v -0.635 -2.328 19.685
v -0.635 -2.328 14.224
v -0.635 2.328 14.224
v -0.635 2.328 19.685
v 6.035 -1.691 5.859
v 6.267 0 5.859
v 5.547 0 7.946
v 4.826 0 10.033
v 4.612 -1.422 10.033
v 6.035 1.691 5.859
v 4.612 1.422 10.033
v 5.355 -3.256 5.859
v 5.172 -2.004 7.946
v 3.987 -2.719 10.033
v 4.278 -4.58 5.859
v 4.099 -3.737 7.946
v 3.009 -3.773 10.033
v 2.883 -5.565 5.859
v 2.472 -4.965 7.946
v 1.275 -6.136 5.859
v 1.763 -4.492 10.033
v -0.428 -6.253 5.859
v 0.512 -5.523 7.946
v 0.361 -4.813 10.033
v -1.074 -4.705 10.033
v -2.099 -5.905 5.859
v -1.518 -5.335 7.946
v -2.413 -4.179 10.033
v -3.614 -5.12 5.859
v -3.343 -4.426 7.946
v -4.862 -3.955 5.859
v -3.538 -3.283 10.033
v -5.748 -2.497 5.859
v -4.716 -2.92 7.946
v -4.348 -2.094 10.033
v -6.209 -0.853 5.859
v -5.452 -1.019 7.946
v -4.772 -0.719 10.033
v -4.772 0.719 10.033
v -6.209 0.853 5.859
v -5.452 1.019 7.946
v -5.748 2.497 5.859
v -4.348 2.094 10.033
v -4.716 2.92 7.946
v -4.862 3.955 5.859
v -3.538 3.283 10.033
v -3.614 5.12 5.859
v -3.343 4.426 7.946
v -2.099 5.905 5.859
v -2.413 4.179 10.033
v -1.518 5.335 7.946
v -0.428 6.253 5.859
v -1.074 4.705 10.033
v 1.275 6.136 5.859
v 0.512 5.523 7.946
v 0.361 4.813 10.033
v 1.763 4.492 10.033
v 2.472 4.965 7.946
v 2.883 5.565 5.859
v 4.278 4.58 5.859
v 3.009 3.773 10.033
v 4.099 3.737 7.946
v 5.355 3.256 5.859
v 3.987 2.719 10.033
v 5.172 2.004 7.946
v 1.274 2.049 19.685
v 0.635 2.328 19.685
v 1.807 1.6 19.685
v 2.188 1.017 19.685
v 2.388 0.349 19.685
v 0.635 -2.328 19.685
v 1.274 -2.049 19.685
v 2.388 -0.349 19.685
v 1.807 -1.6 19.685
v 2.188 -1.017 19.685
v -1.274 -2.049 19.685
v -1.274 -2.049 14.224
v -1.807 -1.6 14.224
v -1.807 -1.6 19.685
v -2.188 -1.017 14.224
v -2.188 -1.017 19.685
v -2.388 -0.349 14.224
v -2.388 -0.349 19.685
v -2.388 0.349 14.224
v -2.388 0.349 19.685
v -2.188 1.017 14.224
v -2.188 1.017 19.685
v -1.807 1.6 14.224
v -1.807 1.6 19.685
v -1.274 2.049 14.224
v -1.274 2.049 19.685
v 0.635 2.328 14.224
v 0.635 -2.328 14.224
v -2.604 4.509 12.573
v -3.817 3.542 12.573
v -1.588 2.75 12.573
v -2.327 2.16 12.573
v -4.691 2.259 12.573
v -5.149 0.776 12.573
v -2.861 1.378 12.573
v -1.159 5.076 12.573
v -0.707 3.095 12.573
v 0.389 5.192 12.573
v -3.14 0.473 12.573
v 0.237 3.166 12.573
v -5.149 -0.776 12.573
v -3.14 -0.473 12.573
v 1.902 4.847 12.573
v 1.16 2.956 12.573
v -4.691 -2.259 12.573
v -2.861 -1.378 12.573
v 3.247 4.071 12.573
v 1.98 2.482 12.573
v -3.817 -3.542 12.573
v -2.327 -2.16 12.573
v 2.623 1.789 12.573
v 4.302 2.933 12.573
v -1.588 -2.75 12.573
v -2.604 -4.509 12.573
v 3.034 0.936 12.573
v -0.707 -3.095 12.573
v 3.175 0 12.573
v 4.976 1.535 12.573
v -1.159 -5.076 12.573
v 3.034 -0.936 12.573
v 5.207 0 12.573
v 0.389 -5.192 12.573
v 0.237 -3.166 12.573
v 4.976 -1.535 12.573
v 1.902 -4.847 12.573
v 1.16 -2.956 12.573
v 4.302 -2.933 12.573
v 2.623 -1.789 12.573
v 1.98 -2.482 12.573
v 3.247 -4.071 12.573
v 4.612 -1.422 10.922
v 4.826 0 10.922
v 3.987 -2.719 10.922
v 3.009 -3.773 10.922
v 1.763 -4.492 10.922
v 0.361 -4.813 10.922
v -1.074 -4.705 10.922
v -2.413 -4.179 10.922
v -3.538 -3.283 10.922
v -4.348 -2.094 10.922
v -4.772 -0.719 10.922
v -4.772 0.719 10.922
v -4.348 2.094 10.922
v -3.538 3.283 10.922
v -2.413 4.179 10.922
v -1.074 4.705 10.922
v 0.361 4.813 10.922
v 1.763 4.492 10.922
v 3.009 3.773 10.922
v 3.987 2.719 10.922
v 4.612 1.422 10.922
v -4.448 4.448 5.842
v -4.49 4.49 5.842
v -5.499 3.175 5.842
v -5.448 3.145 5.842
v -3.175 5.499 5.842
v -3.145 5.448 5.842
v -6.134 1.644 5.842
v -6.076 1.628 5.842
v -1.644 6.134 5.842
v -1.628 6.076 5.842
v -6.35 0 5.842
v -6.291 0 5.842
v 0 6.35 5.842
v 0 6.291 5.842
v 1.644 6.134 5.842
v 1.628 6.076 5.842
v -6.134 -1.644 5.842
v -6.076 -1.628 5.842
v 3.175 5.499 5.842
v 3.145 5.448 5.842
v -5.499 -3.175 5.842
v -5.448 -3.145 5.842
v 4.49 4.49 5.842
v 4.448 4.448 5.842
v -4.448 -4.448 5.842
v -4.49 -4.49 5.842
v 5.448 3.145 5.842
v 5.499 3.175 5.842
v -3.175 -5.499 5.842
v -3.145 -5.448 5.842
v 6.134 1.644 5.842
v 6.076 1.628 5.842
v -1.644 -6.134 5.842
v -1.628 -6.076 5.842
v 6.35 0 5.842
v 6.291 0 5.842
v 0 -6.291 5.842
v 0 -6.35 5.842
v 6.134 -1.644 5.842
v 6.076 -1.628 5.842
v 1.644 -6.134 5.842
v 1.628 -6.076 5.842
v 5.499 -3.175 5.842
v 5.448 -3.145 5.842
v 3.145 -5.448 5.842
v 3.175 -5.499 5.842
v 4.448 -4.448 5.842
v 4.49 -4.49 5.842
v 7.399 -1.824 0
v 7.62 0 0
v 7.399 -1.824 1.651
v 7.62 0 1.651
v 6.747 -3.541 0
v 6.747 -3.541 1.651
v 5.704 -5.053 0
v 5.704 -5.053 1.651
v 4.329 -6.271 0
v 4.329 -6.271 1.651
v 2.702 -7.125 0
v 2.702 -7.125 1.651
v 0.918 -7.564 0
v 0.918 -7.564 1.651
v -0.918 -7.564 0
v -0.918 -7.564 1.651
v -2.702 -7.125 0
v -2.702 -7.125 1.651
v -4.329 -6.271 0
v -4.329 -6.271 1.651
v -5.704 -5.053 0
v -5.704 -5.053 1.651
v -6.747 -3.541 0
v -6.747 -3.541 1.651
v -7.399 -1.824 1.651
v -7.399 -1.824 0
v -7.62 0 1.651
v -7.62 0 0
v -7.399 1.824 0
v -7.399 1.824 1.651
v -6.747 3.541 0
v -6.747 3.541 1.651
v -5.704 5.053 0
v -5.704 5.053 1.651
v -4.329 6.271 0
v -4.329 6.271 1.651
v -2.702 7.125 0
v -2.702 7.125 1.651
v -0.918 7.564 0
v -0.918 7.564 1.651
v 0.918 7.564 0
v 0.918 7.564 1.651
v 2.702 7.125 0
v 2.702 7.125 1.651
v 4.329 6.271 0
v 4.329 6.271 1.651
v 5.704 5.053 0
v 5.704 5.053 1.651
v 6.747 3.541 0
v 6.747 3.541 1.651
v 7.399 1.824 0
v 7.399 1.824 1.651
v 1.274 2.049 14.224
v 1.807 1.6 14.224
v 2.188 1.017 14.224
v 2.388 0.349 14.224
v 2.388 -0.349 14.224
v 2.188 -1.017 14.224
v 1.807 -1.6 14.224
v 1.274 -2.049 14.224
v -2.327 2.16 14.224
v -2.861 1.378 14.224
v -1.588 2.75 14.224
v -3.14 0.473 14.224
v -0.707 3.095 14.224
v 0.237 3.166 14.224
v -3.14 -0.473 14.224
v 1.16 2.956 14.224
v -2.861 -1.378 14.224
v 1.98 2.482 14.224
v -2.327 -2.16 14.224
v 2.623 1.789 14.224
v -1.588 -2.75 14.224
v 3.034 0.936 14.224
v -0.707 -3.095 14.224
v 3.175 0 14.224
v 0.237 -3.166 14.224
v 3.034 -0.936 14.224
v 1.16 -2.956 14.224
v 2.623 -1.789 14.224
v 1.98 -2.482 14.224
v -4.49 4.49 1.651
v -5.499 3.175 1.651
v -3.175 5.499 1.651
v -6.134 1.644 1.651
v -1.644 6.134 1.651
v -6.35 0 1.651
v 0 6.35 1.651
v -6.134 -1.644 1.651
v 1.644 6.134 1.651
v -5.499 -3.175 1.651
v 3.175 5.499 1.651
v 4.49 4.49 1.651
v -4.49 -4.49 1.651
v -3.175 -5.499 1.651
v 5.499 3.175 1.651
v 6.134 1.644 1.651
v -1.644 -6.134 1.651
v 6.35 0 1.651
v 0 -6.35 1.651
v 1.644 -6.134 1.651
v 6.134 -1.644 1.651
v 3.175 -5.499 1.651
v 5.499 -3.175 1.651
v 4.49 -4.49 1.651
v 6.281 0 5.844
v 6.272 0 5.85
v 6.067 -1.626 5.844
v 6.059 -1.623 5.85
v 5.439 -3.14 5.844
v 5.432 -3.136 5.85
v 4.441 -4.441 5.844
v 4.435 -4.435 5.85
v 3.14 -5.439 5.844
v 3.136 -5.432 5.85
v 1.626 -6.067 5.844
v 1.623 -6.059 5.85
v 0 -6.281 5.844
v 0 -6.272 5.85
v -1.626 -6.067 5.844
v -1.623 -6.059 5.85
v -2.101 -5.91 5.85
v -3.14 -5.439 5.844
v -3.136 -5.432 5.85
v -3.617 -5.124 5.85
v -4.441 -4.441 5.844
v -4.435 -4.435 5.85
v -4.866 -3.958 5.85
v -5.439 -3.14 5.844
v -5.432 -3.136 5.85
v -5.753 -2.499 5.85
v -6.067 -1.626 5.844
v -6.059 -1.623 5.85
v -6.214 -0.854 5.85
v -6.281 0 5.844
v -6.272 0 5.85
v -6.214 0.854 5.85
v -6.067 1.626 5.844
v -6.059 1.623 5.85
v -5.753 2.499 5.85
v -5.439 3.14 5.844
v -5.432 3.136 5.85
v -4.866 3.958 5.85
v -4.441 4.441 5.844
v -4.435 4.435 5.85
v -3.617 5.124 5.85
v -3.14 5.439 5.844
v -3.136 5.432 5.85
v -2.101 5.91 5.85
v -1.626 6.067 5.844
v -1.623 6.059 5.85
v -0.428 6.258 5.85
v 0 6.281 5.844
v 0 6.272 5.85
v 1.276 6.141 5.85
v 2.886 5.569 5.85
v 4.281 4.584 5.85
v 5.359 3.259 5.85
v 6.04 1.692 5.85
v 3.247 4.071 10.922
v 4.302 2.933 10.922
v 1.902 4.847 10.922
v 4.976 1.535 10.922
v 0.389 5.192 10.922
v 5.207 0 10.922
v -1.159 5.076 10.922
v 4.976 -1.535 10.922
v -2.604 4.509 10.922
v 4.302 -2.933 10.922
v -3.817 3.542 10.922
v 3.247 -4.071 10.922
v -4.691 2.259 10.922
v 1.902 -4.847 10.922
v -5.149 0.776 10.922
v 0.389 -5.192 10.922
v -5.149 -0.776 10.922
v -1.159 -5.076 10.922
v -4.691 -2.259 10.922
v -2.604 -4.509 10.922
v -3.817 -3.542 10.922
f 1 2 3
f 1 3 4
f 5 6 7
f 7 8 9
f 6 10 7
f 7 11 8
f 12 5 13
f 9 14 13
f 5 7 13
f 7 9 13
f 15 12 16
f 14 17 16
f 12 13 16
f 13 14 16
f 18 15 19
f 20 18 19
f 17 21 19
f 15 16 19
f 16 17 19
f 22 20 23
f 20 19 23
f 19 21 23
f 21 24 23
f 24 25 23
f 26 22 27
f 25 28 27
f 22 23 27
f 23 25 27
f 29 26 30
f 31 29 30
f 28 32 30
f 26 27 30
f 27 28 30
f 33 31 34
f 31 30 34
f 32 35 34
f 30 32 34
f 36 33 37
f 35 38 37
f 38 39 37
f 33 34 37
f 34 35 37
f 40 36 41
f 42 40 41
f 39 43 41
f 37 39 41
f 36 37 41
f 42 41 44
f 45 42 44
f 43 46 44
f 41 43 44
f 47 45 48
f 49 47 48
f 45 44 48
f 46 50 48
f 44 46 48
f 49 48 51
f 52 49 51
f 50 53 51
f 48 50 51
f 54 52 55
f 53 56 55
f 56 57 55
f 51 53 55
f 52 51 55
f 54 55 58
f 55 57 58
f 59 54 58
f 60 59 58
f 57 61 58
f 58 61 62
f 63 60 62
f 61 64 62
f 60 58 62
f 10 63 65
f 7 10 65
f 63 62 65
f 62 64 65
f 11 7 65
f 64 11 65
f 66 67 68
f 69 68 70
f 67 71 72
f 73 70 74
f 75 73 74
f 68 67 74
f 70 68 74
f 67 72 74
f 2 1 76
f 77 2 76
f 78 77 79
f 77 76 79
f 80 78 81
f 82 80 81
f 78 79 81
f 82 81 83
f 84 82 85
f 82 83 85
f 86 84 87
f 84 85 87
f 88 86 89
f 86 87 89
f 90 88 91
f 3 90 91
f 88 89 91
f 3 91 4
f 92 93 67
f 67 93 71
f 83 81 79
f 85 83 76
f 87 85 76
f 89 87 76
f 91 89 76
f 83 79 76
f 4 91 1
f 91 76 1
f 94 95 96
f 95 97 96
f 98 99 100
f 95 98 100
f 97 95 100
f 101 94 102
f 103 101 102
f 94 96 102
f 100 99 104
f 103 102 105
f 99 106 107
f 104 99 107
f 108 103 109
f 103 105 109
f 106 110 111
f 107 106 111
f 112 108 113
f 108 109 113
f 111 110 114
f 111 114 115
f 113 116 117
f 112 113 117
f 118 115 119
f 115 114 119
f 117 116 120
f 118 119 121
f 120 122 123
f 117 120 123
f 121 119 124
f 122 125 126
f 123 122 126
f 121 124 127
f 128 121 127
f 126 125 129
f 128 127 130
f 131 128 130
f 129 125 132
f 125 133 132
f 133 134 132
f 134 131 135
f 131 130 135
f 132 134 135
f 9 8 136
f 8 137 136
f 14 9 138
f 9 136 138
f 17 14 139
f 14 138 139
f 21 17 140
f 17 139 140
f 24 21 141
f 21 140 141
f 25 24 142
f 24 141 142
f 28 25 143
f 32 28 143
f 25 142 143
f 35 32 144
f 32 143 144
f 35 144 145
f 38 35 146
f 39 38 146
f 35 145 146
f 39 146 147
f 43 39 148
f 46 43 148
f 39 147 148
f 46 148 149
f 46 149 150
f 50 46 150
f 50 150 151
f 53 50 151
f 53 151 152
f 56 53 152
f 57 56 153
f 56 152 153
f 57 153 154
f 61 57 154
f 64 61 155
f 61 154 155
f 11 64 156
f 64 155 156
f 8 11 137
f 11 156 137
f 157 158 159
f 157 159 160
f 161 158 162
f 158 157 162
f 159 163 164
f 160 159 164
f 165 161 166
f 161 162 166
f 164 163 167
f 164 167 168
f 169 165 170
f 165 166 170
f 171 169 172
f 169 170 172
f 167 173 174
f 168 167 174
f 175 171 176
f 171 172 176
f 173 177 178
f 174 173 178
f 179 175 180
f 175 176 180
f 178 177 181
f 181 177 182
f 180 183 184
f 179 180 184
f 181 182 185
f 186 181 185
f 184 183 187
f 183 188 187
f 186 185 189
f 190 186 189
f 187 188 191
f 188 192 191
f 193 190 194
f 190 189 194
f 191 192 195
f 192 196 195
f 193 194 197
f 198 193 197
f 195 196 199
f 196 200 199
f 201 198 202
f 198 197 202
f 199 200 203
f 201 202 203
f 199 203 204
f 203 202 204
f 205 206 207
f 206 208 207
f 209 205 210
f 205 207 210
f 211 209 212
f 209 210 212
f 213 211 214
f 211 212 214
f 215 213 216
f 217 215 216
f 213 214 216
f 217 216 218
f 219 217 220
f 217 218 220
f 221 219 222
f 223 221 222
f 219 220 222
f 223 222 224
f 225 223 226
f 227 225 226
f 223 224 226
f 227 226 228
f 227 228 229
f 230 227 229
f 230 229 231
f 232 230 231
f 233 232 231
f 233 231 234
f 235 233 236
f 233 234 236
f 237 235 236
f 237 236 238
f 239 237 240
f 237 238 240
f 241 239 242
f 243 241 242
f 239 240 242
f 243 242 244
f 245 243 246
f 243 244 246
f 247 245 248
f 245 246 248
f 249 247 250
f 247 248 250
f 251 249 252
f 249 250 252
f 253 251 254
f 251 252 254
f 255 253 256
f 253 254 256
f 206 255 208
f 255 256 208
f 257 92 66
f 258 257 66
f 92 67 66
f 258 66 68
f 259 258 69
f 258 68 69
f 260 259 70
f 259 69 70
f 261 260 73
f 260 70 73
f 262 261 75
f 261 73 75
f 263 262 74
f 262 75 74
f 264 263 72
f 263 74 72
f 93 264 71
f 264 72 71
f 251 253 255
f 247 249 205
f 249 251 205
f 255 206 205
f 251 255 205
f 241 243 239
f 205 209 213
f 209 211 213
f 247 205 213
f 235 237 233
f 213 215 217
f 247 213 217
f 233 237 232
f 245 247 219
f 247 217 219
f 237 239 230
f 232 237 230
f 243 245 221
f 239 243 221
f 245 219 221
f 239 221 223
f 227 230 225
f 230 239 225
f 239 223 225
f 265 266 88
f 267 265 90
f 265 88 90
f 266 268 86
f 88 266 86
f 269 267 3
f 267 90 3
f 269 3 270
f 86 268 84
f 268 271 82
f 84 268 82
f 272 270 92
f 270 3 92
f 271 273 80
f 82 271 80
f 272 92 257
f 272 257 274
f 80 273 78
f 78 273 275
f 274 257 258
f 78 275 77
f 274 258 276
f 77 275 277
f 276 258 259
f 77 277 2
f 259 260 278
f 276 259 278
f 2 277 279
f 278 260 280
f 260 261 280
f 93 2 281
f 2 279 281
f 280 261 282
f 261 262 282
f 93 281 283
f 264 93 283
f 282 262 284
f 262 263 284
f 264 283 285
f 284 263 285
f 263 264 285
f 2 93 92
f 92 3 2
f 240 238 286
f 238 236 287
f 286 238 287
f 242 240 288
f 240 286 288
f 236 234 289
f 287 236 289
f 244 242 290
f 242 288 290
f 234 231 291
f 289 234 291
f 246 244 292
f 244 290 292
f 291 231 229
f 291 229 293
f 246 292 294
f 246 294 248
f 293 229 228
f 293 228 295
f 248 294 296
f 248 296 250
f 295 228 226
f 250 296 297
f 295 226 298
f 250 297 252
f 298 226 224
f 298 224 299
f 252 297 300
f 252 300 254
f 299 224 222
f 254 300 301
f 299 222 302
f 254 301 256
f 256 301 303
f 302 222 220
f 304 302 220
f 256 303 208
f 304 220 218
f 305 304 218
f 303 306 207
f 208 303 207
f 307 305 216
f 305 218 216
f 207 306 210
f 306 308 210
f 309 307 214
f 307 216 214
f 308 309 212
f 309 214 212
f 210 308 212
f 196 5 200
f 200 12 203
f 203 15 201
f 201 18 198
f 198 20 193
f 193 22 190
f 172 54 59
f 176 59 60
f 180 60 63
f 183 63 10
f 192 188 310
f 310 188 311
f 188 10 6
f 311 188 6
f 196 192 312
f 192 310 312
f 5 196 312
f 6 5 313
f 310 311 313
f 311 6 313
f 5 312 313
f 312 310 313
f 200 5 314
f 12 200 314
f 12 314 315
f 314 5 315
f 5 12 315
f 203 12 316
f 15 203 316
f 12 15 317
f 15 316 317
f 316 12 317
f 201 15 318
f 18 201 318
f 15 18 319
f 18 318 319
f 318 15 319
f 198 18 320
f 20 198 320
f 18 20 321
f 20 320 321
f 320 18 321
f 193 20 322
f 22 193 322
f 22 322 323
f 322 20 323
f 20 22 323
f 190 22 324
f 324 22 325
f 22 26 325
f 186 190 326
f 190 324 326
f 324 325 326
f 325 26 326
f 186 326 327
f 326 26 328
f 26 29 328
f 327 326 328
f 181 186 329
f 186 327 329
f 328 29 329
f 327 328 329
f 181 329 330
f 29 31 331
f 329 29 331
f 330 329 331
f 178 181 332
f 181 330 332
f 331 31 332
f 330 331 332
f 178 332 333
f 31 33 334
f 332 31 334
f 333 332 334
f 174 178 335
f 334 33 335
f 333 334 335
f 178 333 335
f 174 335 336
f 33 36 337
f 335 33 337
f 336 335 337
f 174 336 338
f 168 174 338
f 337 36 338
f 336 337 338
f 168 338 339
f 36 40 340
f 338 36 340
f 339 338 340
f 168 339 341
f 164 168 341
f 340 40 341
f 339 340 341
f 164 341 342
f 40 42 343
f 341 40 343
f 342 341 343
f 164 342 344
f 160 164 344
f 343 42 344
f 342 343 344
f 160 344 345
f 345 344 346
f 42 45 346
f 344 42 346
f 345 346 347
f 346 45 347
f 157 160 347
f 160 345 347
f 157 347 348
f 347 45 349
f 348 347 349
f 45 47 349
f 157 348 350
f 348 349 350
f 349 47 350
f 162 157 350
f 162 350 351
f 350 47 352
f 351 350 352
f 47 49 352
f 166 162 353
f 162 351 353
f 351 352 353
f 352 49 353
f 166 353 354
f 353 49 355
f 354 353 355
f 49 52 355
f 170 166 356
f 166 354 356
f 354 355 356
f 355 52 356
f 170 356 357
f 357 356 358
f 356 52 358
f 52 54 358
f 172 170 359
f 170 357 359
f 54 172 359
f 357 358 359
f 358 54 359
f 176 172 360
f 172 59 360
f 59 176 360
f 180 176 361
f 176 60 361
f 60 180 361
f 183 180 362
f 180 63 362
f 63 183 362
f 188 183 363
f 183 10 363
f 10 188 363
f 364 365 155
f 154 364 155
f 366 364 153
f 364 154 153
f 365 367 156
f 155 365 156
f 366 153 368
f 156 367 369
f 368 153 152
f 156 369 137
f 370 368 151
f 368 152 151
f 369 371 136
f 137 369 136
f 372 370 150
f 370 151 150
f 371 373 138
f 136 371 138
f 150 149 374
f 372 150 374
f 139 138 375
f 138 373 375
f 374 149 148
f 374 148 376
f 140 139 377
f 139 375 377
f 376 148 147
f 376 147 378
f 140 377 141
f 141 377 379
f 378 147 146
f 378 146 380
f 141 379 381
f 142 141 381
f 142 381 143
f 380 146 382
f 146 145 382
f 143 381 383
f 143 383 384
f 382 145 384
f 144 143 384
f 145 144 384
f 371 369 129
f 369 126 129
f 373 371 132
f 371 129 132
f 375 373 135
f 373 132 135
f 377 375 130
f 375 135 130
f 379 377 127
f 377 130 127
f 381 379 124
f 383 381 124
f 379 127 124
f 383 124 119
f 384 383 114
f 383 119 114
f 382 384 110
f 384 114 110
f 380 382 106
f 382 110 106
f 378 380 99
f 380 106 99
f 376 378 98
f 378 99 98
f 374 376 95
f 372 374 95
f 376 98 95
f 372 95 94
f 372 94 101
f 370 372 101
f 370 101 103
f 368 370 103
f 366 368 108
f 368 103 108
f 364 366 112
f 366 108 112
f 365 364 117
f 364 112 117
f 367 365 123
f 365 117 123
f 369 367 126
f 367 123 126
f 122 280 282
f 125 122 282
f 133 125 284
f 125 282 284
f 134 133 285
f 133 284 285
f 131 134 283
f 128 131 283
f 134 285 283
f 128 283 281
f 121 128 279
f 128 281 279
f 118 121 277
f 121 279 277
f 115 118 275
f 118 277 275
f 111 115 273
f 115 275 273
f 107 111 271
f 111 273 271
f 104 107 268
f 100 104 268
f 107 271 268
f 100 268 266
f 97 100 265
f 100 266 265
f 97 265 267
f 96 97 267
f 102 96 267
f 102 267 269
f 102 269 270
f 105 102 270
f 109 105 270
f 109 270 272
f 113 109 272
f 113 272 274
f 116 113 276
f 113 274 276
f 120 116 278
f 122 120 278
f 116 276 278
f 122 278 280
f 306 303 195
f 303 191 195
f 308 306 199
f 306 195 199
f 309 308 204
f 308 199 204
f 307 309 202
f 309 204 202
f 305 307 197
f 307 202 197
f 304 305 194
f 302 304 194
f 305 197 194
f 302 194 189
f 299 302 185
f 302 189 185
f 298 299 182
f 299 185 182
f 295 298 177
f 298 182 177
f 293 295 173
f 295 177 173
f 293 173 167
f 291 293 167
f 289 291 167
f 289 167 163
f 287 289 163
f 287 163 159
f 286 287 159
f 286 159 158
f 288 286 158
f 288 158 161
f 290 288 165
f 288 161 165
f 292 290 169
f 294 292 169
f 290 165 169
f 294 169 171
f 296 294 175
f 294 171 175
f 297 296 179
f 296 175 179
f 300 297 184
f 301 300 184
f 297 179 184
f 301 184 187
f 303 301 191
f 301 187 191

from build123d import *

# Parameters (mm, degrees)
F0_W     = 0.635
F0_H     = 5.461
F2_DEPTH = 3.175


with BuildPart() as f1:
    # F0 (on Front) → F1 (revolve)
    with BuildSketch(Plane.XZ):
        with BuildLine():
            Line((0, 0), (7.62, 0))
            Line((7.62, 0), (7.62, 1.651))
            Line((7.62, 1.651), (6.35, 1.651))
            Line((6.35, 1.651), (6.35, 5.842))
            Line((6.35, 5.842), (6.290507, 5.842))
            ThreePointArc((6.290507, 5.842), (6.276233, 5.846566), (6.267258, 5.858569))
            Line((6.267258, 5.858569), (4.826, 10.033))
            Line((4.826, 10.033), (4.826, 10.922))
            Line((4.826, 10.922), (5.207, 10.922))
            Line((5.207, 10.922), (5.207, 12.573))
            Line((5.207, 12.573), (3.175, 12.573))
            Line((3.175, 12.573), (3.175, 14.224))
            Line((3.175, 14.224), (2.413, 14.224))
            Line((2.413, 14.224), (2.413, 19.685))
            Line((2.413, 19.685), (0.635, 19.685))
            Line((0.635, 19.685), (0.635, 14.224))
            Line((0.635, 14.224), (0, 14.224))
            Line((0, 14.224), (0, 0))
        make_face()
    revolve(axis=Axis((0, 0, 13.806538), (0, 0, -1)))

    # F0 (on Front) → F2 (cut, symmetric)
    with BuildSketch(Plane.XZ):
        with Locations((-0.3175, 16.9545)):
            Rectangle(F0_W, F0_H)
        with Locations((0.3175, 16.9545)):
            Rectangle(F0_W, F0_H)
    extrude(amount=F2_DEPTH, both=True, mode=Mode.SUBTRACT)


solid = f1.part
